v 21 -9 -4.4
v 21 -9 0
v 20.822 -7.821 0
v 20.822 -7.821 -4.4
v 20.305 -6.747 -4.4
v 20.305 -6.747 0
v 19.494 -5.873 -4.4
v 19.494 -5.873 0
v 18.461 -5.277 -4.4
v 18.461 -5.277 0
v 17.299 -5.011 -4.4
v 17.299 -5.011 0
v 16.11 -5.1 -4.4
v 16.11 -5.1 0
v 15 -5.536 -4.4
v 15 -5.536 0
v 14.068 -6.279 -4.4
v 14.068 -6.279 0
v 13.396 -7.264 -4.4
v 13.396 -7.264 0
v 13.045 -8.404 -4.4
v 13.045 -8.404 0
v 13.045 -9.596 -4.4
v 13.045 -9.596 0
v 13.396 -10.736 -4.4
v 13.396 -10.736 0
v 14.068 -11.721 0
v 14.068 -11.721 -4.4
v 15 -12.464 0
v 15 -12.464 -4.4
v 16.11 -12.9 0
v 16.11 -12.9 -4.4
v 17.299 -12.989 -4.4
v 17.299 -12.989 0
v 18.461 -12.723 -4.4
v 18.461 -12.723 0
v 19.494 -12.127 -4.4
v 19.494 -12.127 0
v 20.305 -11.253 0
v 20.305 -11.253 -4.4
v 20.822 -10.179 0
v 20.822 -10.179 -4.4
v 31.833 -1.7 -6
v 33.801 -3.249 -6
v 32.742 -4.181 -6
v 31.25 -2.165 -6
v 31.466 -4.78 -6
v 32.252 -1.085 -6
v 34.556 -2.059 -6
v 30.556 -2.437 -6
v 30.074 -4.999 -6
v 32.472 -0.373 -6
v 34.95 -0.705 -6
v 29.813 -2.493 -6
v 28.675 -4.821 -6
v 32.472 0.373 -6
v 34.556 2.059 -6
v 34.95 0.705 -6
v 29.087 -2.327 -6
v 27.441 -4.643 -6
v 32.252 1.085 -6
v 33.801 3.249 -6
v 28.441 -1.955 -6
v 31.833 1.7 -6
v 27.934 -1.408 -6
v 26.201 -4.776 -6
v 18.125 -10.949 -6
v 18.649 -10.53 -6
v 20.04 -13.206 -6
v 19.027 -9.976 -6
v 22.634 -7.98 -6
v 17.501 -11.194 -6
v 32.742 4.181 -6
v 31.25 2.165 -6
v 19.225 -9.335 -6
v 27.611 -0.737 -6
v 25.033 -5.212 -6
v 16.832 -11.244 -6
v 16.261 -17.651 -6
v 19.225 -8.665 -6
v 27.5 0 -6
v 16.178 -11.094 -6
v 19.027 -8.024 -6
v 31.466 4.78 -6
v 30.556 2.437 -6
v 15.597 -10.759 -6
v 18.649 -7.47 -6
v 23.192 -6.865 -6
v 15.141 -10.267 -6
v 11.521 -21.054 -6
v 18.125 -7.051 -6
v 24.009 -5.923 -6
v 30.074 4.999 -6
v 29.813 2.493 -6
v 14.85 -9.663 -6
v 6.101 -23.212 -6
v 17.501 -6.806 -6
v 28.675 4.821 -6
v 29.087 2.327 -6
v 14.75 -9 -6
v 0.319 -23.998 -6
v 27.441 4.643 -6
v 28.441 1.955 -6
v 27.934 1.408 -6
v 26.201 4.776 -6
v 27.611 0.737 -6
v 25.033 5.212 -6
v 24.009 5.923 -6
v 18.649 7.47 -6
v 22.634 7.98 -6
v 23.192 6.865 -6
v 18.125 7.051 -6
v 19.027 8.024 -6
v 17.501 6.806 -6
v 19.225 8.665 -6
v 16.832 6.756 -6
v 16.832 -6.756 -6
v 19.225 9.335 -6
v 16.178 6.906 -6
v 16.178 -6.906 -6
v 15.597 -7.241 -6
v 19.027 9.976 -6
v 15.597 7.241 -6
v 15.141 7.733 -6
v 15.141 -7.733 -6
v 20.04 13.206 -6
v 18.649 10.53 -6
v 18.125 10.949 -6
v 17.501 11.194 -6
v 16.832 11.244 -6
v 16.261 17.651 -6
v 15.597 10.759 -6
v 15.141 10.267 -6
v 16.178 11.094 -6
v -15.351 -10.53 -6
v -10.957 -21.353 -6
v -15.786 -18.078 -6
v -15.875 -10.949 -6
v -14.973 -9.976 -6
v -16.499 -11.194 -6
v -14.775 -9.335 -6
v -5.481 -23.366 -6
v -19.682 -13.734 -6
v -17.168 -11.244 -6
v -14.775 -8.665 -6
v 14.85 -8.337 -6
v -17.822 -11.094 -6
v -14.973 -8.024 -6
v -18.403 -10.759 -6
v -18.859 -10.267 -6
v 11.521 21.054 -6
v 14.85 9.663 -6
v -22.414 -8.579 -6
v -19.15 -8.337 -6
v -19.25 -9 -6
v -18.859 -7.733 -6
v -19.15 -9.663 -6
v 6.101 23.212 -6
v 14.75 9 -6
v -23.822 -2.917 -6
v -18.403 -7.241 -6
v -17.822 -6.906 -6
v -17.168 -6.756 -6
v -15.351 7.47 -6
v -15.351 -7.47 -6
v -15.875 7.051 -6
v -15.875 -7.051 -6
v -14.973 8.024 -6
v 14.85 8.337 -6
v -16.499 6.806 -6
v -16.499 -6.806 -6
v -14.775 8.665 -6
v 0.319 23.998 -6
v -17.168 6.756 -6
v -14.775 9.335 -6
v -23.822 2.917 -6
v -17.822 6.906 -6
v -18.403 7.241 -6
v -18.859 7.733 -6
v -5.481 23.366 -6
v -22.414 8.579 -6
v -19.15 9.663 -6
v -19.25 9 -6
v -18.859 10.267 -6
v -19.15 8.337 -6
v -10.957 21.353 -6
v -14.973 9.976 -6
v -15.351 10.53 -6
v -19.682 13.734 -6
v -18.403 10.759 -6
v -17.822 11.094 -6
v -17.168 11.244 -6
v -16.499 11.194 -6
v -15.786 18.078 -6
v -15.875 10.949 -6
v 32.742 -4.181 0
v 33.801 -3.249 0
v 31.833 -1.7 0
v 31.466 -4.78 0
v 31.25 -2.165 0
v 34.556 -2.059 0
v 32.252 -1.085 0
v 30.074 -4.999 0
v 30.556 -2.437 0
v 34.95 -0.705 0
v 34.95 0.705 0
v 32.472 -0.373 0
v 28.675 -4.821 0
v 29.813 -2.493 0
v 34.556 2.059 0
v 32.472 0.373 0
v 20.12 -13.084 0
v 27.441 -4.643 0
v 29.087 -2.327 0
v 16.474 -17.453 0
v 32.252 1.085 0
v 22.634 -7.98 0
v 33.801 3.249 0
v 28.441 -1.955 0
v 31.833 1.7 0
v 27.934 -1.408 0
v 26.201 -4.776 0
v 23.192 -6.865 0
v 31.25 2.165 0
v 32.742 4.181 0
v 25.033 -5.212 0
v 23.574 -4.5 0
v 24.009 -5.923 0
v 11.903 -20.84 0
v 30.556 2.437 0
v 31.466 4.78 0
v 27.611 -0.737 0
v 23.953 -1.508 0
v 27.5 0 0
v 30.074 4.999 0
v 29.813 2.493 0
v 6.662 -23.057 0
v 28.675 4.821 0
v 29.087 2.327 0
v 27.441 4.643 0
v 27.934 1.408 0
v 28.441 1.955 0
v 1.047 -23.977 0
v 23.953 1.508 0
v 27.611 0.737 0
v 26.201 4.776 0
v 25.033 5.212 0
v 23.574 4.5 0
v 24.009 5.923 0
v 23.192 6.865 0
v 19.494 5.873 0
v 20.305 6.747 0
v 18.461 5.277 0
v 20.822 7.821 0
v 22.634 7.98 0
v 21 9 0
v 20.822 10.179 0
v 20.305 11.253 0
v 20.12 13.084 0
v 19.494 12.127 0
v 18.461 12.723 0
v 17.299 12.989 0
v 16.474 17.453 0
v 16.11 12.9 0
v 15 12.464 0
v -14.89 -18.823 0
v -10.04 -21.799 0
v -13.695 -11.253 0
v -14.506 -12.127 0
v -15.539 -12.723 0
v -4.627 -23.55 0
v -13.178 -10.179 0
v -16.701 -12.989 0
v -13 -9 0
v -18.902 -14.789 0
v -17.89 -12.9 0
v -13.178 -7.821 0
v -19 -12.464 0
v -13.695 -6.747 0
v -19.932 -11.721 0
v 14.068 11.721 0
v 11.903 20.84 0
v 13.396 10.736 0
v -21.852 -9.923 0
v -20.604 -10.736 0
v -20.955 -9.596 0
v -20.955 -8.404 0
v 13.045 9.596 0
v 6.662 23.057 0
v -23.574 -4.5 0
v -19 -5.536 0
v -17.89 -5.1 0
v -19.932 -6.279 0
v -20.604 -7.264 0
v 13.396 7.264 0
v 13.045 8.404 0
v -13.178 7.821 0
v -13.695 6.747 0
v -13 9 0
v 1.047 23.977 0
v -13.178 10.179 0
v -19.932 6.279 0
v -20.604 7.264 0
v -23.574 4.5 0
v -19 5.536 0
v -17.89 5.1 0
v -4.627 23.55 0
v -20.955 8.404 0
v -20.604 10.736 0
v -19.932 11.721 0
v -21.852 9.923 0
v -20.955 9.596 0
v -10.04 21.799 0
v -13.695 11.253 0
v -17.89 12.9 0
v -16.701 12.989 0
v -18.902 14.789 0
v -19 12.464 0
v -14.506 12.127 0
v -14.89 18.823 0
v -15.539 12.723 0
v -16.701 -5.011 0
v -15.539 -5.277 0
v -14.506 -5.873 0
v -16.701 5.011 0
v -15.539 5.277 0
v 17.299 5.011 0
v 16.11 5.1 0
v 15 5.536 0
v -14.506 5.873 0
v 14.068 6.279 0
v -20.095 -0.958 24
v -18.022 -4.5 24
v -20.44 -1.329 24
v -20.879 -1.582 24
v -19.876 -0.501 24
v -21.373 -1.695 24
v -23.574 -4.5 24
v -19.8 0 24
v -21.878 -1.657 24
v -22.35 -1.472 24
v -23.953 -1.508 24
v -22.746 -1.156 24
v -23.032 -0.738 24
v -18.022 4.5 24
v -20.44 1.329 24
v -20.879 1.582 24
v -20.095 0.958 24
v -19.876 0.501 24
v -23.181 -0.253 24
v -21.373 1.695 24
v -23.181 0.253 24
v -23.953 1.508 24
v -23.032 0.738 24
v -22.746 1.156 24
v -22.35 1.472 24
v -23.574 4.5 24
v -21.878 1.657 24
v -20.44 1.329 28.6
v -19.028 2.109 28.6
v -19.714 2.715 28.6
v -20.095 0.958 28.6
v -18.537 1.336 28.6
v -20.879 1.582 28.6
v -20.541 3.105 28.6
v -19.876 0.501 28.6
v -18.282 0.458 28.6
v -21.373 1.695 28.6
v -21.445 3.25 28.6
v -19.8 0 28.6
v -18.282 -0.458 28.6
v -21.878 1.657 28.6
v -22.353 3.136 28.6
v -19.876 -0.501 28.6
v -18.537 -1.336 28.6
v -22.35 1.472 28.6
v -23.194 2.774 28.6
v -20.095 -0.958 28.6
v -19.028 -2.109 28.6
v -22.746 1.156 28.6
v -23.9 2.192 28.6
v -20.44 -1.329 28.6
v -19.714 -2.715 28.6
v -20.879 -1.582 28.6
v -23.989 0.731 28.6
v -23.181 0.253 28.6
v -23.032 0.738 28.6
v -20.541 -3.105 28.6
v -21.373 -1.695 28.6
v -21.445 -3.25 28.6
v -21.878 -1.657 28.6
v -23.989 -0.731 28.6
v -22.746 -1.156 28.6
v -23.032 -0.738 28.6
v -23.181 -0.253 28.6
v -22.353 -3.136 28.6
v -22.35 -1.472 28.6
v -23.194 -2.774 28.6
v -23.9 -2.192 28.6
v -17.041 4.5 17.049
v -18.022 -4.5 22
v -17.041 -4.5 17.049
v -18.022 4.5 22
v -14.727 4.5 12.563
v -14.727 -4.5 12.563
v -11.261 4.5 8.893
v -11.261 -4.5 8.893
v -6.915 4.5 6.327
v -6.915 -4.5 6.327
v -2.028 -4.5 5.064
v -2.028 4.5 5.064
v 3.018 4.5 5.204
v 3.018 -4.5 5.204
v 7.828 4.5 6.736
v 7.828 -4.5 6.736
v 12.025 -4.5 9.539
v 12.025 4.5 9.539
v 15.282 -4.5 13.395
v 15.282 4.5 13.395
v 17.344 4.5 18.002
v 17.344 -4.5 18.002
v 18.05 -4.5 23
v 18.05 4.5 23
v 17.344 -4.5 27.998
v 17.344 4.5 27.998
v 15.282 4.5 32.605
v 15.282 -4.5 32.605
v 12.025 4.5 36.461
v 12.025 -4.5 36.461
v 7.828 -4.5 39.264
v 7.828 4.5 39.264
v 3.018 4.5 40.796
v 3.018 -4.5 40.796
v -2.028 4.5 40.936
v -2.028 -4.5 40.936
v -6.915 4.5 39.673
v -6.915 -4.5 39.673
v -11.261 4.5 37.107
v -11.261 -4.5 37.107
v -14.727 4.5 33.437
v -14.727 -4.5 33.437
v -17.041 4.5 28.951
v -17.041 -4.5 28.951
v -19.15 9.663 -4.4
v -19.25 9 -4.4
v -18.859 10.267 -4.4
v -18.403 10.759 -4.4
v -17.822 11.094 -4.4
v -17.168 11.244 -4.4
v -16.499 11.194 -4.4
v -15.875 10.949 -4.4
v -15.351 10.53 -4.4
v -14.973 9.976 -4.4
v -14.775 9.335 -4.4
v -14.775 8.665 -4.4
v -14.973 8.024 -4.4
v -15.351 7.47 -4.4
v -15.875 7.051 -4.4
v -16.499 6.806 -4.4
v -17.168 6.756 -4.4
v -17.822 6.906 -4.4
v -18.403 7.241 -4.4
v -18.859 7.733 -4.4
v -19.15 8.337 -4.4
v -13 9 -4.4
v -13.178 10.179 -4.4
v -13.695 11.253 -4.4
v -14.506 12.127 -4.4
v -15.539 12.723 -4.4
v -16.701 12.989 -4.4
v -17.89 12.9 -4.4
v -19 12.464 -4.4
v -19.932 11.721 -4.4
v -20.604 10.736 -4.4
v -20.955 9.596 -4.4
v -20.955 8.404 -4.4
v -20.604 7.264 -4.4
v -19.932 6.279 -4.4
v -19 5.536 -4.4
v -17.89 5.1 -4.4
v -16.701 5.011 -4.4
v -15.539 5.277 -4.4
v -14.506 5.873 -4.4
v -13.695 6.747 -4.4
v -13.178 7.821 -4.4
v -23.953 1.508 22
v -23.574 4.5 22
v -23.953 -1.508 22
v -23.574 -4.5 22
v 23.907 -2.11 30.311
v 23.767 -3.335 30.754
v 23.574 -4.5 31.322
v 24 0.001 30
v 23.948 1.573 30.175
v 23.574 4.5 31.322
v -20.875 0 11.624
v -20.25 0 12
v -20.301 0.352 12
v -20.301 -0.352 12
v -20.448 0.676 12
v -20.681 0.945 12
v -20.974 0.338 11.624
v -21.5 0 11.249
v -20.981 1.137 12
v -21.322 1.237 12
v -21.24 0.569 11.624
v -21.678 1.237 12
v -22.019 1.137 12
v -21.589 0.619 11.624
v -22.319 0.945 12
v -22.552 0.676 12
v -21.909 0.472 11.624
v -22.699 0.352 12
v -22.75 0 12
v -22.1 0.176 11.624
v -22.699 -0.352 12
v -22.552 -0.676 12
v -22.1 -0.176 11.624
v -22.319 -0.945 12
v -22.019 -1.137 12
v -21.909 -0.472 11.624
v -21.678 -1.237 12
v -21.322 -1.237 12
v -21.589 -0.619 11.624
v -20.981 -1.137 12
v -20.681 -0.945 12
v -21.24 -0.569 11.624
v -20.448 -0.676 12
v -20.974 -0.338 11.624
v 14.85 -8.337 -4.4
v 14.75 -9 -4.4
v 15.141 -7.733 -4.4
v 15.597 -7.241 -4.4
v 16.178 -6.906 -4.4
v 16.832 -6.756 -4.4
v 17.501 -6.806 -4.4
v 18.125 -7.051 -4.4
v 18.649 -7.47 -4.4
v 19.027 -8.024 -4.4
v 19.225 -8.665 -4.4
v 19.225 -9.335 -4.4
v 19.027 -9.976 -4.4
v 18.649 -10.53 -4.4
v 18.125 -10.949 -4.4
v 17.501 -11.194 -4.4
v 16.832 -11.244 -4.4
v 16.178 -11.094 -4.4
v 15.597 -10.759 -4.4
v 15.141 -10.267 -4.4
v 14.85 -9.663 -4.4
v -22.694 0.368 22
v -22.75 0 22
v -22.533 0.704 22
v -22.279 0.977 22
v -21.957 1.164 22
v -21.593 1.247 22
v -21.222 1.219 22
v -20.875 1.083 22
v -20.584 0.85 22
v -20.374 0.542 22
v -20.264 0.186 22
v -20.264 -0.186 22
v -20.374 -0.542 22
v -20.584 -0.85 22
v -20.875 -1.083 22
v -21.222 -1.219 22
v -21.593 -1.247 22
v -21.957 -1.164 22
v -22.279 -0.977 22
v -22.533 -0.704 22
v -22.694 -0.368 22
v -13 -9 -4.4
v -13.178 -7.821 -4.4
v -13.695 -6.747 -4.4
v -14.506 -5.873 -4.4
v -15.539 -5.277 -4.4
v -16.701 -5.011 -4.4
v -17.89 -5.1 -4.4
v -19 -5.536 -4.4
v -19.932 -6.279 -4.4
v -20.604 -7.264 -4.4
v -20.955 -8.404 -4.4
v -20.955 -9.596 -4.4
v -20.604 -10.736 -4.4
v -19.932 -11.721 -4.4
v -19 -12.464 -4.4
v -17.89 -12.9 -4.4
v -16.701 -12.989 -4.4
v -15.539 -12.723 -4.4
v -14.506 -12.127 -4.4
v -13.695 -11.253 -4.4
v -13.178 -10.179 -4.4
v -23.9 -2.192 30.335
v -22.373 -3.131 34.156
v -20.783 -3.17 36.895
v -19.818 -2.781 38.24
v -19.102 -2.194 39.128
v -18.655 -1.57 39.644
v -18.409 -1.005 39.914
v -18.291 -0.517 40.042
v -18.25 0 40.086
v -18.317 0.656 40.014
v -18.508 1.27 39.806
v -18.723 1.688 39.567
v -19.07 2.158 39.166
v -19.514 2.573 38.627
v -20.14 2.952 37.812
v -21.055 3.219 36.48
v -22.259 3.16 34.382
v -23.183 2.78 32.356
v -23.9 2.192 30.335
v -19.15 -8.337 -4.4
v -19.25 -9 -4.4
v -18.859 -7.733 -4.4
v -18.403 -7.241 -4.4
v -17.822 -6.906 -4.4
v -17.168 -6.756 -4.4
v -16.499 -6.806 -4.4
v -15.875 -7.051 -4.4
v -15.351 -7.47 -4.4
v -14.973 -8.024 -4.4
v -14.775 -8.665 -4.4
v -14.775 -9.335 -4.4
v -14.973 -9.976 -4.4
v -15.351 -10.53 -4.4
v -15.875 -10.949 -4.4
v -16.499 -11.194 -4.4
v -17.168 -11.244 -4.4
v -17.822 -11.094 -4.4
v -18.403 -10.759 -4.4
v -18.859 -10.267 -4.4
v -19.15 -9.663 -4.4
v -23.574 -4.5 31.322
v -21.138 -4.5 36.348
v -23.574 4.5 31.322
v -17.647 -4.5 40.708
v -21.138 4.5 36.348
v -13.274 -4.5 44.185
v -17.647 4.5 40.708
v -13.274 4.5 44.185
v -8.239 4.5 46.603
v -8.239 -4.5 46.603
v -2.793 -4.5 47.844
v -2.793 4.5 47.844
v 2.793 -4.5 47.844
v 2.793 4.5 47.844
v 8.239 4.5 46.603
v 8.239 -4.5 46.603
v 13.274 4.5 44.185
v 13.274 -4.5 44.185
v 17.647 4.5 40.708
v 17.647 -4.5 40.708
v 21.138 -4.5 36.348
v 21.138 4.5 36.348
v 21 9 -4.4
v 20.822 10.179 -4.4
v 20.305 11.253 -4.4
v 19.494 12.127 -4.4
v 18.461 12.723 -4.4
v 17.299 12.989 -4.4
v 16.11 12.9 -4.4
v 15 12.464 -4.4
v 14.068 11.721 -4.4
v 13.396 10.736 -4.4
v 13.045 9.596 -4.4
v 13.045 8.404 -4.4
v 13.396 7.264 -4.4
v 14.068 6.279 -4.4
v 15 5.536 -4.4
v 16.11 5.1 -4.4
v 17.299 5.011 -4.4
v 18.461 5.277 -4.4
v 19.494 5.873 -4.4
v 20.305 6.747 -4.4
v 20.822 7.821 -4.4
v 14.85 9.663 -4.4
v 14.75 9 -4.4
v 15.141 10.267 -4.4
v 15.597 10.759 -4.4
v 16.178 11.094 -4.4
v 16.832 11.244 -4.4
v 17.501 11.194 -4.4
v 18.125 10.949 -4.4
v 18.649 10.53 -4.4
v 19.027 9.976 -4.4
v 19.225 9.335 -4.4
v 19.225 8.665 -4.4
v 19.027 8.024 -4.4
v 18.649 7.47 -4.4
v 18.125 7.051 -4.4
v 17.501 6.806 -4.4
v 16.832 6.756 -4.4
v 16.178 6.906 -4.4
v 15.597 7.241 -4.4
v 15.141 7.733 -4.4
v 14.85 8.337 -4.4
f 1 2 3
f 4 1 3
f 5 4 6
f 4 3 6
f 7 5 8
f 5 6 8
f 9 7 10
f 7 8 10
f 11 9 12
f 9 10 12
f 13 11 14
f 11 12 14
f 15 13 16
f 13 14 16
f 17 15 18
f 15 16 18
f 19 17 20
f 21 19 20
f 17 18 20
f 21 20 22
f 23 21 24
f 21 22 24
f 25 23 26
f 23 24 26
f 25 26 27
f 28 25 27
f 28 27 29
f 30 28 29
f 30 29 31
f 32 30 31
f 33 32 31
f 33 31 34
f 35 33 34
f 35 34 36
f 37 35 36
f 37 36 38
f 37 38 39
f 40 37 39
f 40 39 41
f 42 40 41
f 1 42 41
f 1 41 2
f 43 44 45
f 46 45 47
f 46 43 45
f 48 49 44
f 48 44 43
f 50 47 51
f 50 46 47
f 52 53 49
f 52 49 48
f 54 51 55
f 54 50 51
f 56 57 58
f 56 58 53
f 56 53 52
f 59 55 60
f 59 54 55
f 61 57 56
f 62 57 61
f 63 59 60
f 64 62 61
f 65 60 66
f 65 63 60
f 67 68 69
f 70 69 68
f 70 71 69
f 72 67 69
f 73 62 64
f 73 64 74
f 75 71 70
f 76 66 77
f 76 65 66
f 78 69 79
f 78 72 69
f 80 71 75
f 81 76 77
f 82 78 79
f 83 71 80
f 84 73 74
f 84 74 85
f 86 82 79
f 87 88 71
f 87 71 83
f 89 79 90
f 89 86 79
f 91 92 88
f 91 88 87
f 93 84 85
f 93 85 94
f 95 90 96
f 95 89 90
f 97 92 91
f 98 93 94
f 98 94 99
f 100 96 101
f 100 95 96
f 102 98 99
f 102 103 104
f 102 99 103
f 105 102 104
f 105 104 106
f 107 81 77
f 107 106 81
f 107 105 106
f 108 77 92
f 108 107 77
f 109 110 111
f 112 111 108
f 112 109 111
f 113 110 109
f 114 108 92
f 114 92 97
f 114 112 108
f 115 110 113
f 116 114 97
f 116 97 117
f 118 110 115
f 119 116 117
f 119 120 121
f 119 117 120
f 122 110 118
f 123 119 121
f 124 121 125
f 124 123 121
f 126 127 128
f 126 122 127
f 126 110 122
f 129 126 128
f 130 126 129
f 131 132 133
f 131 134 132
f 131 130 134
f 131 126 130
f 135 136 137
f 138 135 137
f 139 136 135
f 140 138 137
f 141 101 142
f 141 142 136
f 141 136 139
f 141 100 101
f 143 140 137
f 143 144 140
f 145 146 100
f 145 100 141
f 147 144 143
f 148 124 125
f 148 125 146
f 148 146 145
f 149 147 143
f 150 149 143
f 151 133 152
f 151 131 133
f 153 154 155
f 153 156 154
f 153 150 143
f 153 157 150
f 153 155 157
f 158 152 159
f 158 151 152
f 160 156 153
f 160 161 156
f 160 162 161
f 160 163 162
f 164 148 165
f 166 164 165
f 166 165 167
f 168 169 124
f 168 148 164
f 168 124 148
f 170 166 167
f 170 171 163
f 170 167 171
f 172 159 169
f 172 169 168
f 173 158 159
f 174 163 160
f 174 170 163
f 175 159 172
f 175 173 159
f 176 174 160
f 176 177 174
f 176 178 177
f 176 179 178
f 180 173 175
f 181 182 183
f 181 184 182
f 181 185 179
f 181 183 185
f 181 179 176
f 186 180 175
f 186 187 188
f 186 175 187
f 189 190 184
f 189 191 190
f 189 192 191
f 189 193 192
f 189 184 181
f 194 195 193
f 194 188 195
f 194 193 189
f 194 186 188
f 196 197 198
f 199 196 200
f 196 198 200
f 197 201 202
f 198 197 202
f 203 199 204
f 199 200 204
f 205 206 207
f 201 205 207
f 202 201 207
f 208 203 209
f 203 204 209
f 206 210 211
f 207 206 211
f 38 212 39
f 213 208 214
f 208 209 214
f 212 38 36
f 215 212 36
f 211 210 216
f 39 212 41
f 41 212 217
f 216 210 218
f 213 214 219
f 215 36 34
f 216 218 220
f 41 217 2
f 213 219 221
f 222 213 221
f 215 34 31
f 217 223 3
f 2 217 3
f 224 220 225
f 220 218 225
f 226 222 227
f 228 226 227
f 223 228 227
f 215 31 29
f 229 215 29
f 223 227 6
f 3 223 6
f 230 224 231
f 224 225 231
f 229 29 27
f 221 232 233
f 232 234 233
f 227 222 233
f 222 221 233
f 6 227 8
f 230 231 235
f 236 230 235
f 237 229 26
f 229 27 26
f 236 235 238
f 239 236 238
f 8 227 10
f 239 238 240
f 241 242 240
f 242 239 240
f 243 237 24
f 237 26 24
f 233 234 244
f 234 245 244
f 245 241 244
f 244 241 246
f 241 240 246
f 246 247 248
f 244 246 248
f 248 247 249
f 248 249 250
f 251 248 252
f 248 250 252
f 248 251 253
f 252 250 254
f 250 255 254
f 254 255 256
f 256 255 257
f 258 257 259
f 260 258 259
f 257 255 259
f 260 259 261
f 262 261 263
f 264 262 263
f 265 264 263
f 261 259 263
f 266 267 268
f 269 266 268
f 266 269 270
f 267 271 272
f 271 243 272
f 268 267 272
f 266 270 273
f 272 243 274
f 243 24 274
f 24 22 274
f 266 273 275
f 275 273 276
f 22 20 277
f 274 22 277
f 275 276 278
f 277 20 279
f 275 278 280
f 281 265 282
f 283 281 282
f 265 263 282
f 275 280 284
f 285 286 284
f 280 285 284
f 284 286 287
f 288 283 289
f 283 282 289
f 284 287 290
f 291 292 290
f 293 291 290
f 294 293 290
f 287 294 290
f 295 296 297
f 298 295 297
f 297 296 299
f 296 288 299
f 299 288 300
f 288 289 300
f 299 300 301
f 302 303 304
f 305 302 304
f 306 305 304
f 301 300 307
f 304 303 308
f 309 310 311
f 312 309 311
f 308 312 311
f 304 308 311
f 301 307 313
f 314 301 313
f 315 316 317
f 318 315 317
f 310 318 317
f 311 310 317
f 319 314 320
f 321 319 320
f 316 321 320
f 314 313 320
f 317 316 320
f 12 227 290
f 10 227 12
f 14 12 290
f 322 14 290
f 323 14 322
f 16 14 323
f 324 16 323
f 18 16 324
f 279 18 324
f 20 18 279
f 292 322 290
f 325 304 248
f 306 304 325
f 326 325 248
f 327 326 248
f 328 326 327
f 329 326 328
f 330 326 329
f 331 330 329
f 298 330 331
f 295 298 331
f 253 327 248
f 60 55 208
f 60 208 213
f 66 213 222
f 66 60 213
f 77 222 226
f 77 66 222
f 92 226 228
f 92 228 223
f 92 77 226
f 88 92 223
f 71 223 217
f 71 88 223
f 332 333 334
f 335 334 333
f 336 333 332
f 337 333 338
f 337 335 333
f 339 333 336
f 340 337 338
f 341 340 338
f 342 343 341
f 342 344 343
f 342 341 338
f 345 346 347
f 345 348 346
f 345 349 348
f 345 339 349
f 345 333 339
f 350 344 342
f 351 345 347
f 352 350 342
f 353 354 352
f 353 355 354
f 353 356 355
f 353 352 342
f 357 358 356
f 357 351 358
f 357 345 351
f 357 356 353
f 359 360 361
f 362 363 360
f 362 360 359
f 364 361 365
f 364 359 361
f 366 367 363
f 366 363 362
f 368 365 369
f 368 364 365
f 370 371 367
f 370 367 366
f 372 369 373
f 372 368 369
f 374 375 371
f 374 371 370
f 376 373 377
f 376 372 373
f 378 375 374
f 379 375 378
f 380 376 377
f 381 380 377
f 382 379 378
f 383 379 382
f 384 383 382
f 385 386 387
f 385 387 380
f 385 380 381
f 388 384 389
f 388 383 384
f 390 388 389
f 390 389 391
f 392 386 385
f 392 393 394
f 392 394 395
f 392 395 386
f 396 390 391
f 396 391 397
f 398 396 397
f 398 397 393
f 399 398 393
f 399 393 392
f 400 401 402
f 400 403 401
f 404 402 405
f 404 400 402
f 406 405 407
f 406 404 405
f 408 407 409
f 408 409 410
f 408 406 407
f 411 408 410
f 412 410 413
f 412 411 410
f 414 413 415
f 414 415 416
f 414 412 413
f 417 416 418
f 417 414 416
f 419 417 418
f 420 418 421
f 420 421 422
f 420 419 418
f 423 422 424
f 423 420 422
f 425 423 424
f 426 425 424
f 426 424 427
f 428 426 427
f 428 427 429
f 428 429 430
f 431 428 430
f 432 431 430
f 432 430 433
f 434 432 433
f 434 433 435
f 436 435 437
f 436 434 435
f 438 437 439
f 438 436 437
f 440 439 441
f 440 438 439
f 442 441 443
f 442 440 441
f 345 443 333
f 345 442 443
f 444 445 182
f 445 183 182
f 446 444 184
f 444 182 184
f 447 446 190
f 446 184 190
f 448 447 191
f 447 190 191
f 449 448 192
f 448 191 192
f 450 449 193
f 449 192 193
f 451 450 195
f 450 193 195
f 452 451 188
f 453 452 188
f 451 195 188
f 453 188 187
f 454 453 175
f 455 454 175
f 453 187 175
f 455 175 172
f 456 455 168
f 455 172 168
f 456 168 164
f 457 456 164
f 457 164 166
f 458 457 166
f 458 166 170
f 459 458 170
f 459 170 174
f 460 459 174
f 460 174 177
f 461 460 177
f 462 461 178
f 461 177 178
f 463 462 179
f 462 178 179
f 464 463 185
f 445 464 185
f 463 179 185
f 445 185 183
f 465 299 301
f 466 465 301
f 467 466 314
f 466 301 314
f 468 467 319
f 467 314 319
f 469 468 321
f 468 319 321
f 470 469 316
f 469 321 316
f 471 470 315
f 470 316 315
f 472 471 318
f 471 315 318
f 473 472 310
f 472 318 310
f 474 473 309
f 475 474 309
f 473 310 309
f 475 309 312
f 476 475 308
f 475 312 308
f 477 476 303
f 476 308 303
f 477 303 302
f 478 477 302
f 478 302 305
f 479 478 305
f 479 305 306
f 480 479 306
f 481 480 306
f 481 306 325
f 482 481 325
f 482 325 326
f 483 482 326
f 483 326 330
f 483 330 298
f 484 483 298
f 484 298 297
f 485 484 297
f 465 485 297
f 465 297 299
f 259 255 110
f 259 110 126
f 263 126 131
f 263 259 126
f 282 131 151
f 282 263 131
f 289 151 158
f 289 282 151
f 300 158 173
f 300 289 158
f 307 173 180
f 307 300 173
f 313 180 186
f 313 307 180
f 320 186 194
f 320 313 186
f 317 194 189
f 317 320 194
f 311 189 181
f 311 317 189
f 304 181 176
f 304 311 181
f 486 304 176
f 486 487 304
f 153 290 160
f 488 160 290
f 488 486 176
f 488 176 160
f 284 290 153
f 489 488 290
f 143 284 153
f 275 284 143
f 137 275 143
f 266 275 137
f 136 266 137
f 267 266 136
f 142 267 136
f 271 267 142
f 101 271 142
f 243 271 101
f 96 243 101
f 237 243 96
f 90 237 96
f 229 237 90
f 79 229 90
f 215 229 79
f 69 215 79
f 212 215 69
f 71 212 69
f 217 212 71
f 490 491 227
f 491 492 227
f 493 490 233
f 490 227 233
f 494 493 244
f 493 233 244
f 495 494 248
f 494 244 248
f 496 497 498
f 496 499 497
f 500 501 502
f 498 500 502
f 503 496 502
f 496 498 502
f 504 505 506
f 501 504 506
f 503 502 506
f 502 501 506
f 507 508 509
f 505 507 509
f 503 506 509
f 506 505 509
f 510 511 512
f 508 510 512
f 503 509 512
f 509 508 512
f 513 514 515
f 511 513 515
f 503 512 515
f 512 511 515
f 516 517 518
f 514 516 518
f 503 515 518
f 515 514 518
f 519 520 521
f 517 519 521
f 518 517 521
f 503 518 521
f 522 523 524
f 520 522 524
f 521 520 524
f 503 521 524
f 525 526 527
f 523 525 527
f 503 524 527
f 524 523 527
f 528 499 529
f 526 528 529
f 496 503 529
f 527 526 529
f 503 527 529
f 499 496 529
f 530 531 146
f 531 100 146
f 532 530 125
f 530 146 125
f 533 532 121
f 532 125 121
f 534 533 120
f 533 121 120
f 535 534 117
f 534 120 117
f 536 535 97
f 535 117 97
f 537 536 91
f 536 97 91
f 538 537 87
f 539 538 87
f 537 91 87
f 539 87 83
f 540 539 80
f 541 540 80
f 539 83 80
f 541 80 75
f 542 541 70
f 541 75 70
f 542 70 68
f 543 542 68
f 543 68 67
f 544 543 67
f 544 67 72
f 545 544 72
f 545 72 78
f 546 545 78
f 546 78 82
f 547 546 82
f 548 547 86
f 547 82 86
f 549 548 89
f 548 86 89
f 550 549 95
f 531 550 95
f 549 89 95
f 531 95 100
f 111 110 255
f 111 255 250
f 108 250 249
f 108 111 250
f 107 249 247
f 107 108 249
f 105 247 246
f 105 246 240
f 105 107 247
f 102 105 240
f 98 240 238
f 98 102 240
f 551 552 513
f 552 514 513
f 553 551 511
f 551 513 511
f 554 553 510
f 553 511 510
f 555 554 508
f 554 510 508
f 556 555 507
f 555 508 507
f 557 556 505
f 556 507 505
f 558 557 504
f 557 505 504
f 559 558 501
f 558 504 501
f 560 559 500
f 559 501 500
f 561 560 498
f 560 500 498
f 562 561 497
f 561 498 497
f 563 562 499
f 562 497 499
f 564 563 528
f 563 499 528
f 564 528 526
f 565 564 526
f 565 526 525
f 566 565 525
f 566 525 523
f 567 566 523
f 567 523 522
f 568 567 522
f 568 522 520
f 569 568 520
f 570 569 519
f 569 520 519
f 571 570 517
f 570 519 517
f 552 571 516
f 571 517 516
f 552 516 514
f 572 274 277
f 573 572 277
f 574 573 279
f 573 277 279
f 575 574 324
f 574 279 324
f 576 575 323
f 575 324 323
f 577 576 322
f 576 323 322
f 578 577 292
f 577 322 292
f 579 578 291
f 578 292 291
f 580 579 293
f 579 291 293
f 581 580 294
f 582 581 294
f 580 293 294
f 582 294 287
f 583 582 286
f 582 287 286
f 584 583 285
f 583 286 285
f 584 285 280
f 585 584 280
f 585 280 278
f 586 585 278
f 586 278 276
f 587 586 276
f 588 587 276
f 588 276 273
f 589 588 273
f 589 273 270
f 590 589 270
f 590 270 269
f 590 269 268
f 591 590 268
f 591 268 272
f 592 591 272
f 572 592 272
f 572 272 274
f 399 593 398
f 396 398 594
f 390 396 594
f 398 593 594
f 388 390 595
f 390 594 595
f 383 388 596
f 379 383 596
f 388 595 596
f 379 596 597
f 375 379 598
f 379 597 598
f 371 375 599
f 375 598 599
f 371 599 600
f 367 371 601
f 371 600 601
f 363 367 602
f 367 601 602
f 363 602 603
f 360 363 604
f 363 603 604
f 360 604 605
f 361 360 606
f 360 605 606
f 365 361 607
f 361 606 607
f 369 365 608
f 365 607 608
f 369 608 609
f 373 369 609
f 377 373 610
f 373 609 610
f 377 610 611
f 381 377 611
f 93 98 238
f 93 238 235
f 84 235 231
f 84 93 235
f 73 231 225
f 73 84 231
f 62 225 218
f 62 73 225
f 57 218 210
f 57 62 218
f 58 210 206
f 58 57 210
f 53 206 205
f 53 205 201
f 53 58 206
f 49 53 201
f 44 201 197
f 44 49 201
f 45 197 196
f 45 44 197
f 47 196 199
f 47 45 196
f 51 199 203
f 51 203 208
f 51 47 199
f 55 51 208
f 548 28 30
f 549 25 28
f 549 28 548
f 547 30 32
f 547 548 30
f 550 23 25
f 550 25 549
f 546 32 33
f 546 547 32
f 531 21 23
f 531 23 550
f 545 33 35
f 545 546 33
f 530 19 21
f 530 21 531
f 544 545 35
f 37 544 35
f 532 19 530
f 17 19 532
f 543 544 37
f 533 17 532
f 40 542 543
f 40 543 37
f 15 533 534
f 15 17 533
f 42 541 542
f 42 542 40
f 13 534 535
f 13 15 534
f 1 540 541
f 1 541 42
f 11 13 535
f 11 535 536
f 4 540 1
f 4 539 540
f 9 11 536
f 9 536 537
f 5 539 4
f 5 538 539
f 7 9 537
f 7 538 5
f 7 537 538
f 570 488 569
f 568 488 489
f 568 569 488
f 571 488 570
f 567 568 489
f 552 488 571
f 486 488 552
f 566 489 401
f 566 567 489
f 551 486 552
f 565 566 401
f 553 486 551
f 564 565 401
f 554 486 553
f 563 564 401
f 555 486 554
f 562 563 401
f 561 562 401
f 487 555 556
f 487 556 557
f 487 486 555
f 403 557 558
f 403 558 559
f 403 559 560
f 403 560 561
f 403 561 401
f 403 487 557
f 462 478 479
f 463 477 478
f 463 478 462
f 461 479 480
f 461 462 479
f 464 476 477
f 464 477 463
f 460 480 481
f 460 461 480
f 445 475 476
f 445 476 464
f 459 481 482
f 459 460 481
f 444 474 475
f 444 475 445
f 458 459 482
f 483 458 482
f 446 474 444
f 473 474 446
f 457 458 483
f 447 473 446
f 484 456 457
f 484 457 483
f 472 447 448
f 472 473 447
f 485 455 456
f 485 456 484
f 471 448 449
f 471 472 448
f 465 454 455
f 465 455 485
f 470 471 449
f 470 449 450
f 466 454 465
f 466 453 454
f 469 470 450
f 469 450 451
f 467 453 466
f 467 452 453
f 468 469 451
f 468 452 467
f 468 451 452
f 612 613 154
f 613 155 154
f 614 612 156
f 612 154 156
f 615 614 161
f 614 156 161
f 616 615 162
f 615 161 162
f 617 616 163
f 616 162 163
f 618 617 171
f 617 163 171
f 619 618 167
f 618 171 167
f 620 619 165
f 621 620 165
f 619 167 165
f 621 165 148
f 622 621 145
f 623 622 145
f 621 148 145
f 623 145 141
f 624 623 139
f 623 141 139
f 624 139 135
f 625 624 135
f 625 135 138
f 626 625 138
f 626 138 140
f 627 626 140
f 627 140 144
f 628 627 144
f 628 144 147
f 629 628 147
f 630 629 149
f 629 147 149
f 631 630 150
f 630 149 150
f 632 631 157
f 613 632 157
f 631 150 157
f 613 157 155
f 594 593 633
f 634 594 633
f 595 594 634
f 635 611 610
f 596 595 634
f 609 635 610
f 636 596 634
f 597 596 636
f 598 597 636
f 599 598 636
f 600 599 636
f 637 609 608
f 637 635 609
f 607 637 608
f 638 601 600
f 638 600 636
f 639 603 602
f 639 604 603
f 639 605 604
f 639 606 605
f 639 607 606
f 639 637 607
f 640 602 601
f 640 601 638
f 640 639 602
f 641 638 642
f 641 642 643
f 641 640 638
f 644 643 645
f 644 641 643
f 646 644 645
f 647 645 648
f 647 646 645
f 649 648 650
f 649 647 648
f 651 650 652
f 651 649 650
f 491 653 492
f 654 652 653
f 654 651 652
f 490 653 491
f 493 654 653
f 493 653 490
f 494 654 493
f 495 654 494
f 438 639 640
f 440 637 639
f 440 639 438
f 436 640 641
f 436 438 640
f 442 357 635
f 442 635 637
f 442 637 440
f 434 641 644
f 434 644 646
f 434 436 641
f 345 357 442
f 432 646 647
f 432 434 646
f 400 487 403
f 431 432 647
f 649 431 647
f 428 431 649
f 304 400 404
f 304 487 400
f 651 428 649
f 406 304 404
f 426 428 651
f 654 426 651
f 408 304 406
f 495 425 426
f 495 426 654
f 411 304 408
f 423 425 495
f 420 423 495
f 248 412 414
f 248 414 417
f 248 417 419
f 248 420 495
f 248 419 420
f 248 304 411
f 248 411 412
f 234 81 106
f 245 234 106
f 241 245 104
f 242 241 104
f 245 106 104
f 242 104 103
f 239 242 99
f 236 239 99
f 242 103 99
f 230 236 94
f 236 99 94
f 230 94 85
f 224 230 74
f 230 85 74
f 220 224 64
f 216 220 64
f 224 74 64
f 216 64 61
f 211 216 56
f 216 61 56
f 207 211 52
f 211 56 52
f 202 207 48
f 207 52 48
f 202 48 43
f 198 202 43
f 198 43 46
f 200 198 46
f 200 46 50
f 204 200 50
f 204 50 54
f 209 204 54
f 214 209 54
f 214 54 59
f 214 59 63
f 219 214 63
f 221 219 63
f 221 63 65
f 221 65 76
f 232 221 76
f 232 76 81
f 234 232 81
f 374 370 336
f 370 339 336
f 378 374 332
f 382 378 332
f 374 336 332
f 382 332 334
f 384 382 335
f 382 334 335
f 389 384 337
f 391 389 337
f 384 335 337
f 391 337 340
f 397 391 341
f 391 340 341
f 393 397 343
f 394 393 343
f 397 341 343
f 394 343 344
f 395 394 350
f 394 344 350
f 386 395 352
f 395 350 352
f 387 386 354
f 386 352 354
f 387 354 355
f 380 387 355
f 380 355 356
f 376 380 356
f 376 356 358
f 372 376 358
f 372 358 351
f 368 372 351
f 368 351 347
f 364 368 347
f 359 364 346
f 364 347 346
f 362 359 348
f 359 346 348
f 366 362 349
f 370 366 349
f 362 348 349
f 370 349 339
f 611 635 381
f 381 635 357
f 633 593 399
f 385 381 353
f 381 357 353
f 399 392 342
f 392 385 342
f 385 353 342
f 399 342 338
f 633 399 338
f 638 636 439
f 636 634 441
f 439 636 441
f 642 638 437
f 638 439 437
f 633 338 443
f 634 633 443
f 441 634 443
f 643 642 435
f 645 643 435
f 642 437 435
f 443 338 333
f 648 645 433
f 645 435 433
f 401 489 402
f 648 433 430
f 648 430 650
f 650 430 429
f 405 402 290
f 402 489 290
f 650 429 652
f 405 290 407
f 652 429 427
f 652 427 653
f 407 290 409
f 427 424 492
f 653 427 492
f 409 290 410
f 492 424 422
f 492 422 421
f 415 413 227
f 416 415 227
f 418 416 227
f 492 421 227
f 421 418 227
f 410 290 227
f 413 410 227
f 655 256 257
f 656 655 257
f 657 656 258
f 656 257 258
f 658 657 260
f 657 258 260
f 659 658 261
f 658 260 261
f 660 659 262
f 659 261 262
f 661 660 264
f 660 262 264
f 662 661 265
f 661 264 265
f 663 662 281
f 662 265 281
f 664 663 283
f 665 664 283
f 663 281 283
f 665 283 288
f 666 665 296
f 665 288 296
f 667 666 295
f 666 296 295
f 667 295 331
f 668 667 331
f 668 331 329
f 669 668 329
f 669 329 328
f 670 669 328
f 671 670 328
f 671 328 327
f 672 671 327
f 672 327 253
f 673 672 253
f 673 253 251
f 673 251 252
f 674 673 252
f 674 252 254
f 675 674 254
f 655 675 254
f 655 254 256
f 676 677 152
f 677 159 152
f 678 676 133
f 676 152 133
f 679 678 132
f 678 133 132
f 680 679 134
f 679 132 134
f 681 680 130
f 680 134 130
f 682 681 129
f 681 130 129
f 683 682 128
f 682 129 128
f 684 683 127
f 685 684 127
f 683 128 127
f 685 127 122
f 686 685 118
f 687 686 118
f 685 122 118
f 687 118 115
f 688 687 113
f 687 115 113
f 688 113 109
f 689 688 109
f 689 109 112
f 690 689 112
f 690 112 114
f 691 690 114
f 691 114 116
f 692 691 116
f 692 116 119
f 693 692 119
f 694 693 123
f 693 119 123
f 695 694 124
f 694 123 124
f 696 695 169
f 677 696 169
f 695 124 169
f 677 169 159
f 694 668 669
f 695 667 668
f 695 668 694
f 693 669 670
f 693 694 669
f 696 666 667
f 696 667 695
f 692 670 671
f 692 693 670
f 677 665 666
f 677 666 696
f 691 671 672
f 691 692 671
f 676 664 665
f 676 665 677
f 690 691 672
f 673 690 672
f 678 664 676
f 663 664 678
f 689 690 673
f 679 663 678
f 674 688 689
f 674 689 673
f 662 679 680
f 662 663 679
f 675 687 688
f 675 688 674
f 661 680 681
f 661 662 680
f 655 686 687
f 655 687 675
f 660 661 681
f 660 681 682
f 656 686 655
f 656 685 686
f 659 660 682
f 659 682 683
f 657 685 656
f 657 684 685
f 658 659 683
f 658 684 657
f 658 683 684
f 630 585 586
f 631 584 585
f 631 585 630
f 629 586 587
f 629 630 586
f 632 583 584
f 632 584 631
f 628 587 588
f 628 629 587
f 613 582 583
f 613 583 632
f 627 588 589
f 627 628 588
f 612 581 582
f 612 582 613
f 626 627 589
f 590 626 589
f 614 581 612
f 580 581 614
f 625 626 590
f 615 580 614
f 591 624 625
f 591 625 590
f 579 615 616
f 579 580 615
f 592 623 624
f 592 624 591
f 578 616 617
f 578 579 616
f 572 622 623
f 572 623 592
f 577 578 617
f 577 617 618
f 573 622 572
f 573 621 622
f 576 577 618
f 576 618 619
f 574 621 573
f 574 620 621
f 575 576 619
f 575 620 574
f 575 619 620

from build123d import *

# Parameters (mm, degrees)
SKETCH1_R                                          = 24
BOSS_EXTRUDE1_DEPTH                                = 6
BOSS_EXTRUDE2_DEPTH                                = 4.5
BOSS_EXTRUDE2_DEPTH_BACK                           = 4.5
CHAMBRAGE_POUR_VIS_T_TE_HEXAGONALE_M42_D           = 4.5
CHAMBRAGE_POUR_VIS_T_TE_HEXAGONALE_M42_CBORE_D     = 8
CHAMBRAGE_POUR_VIS_T_TE_HEXAGONALE_M42_CBORE_DEPTH = 4.4
CHAMBRAGE_POUR_VIS_T_TE_HEXAGONALE_M31_D           = 3.4
CHAMBRAGE_POUR_VIS_T_TE_HEXAGONALE_M31_DEPTH       = 21
CHAMBRAGE_POUR_VIS_T_TE_HEXAGONALE_M31_CBORE_D     = 6.5
CHAMBRAGE_POUR_VIS_T_TE_HEXAGONALE_M31_CBORE_DEPTH = 15.4
TROU_POUR_TARAUDAGE_POUR_TROU_TARAUD_M3_D          = 2.5
TROU_POUR_TARAUDAGE_POUR_TROU_TARAUD_M3_DEPTH      = 10
TROU_POUR_TARAUDAGE_POUR_TROU_TARAUD_M3_TIP        = 0.751075774
ESQUISSE8_OUTSIDE_W                                = 69.572
ESQUISSE8_OUTSIDE_H                                = 67.572
ESQUISSE8_OUTSIDE_R                                = 24
ENL_V_MAT_EXTRU_3_DEPTH                            = 49.0000001
ENL_V_MAT_EXTRU_3_DEPTH_BACK                       = 7
BOSS_EXTRU_1_DEPTH                                 = 6
TROU_POUR_TARAUDAGE_POUR_TROU_TARAUD_M6_D          = 5


with BuildPart() as part:
    # Sketch1 → Boss-Extrude1 (new body)
    with BuildSketch(Plane.XY):
        Circle(SKETCH1_R)
    extrude(amount=-BOSS_EXTRUDE1_DEPTH)

    # Sketch2 → Boss-Extrude2 (add, two sides)
    with BuildSketch(Plane(origin=(0, 0, 0), x_dir=(1, 0, 0), z_dir=(0, 1, 0))) as boss_extrude2_sk:
        with BuildLine():
            Line((-18.02227788, -24), (-24.979991994, -24))
            ThreePointArc((-24.979991994, -24), (0.50010007, -47.994997498), (25, -23))
            Line((25, -23), (25, 6))
            Line((25, 6), (-25, 6))
            Line((-25, 6), (-25, -22))
            Line((-25, -22), (-18.02227788, -22))
            ThreePointArc((-18.02227788, -22), (0.500192092, -4.956931861), (18.05, -23))
            ThreePointArc((18.05, -23), (0.500192092, -41.043068139), (-18.02227788, -24))
        make_face()
    extrude(amount=BOSS_EXTRUDE2_DEPTH)
    extrude(boss_extrude2_sk.sketch, amount=-BOSS_EXTRUDE2_DEPTH_BACK)

    # Chambrage pour vis à tête hexagonale M42 (through all)
    with Locations(Plane.XY):
        with Locations((17, 9), (-17, -9), (-17, 9), (17, -9)):
            CounterBoreHole(CHAMBRAGE_POUR_VIS_T_TE_HEXAGONALE_M42_D / 2, CHAMBRAGE_POUR_VIS_T_TE_HEXAGONALE_M42_CBORE_D / 2, CHAMBRAGE_POUR_VIS_T_TE_HEXAGONALE_M42_CBORE_DEPTH)

    # Chambrage pour vis à tête hexagonale M31
    with Locations(Plane(origin=(0, 0, 44), x_dir=(-1, 0, 0), z_dir=(0, 0, 1))):
        with Locations((21.5, 0)):
            CounterBoreHole(CHAMBRAGE_POUR_VIS_T_TE_HEXAGONALE_M31_D / 2, CHAMBRAGE_POUR_VIS_T_TE_HEXAGONALE_M31_CBORE_D / 2, CHAMBRAGE_POUR_VIS_T_TE_HEXAGONALE_M31_CBORE_DEPTH, depth=CHAMBRAGE_POUR_VIS_T_TE_HEXAGONALE_M31_DEPTH)

    # Trou pour taraudage pour trou taraudé M31
    with Locations(Plane.XY.offset(22)):
        with Locations((-21.5, 0)):
            Hole(TROU_POUR_TARAUDAGE_POUR_TROU_TARAUD_M3_D / 2, depth=TROU_POUR_TARAUDAGE_POUR_TROU_TARAUD_M3_DEPTH)
            with Locations((0, 0, -(TROU_POUR_TARAUDAGE_POUR_TROU_TARAUD_M3_DEPTH + TROU_POUR_TARAUDAGE_POUR_TROU_TARAUD_M3_TIP / 2))):  # 118° drill point
                Cone(0, TROU_POUR_TARAUDAGE_POUR_TROU_TARAUD_M3_D / 2, TROU_POUR_TARAUDAGE_POUR_TROU_TARAUD_M3_TIP, mode=Mode.SUBTRACT)

    # Esquisse8 outside → Enlèv. mat.-Extru.3 (cut, two sides)
    with BuildSketch(Plane.XY) as enl_v_mat_extru_3_sk:
        Rectangle(ESQUISSE8_OUTSIDE_W, ESQUISSE8_OUTSIDE_H)
        Circle(ESQUISSE8_OUTSIDE_R, mode=Mode.SUBTRACT)
    extrude(amount=ENL_V_MAT_EXTRU_3_DEPTH, mode=Mode.SUBTRACT)
    extrude(enl_v_mat_extru_3_sk.sketch, amount=-ENL_V_MAT_EXTRU_3_DEPTH_BACK, mode=Mode.SUBTRACT)

    # Esquisse9 → Boss.-Extru.1 (add)
    with BuildSketch(Plane(origin=(0, 0, -6), x_dir=(-1, 0, 0), z_dir=(0, 0, -1))):
        with BuildLine():
            ThreePointArc((-28.675, 4.82124206), (-35, 0), (-28.675, -4.82124206))
            ThreePointArc((-28.675, -4.82124206), (-25.033036693, -5.211718832), (-22.634482759, -7.979986858))
            ThreePointArc((-22.634482759, -7.979986858), (-24, 0), (-22.634482759, 7.979986858))
            ThreePointArc((-22.634482759, 7.979986858), (-25.033036693, 5.211718832), (-28.675, 4.82124206))
        make_face()
    extrude(amount=-BOSS_EXTRU_1_DEPTH)

    # Trou pour taraudage pour trou taraudé M62 (through all)
    with Locations(Plane.XY):
        with Locations((30, 0)):
            Hole(TROU_POUR_TARAUDAGE_POUR_TROU_TARAUD_M6_D / 2)


solid = part.part
